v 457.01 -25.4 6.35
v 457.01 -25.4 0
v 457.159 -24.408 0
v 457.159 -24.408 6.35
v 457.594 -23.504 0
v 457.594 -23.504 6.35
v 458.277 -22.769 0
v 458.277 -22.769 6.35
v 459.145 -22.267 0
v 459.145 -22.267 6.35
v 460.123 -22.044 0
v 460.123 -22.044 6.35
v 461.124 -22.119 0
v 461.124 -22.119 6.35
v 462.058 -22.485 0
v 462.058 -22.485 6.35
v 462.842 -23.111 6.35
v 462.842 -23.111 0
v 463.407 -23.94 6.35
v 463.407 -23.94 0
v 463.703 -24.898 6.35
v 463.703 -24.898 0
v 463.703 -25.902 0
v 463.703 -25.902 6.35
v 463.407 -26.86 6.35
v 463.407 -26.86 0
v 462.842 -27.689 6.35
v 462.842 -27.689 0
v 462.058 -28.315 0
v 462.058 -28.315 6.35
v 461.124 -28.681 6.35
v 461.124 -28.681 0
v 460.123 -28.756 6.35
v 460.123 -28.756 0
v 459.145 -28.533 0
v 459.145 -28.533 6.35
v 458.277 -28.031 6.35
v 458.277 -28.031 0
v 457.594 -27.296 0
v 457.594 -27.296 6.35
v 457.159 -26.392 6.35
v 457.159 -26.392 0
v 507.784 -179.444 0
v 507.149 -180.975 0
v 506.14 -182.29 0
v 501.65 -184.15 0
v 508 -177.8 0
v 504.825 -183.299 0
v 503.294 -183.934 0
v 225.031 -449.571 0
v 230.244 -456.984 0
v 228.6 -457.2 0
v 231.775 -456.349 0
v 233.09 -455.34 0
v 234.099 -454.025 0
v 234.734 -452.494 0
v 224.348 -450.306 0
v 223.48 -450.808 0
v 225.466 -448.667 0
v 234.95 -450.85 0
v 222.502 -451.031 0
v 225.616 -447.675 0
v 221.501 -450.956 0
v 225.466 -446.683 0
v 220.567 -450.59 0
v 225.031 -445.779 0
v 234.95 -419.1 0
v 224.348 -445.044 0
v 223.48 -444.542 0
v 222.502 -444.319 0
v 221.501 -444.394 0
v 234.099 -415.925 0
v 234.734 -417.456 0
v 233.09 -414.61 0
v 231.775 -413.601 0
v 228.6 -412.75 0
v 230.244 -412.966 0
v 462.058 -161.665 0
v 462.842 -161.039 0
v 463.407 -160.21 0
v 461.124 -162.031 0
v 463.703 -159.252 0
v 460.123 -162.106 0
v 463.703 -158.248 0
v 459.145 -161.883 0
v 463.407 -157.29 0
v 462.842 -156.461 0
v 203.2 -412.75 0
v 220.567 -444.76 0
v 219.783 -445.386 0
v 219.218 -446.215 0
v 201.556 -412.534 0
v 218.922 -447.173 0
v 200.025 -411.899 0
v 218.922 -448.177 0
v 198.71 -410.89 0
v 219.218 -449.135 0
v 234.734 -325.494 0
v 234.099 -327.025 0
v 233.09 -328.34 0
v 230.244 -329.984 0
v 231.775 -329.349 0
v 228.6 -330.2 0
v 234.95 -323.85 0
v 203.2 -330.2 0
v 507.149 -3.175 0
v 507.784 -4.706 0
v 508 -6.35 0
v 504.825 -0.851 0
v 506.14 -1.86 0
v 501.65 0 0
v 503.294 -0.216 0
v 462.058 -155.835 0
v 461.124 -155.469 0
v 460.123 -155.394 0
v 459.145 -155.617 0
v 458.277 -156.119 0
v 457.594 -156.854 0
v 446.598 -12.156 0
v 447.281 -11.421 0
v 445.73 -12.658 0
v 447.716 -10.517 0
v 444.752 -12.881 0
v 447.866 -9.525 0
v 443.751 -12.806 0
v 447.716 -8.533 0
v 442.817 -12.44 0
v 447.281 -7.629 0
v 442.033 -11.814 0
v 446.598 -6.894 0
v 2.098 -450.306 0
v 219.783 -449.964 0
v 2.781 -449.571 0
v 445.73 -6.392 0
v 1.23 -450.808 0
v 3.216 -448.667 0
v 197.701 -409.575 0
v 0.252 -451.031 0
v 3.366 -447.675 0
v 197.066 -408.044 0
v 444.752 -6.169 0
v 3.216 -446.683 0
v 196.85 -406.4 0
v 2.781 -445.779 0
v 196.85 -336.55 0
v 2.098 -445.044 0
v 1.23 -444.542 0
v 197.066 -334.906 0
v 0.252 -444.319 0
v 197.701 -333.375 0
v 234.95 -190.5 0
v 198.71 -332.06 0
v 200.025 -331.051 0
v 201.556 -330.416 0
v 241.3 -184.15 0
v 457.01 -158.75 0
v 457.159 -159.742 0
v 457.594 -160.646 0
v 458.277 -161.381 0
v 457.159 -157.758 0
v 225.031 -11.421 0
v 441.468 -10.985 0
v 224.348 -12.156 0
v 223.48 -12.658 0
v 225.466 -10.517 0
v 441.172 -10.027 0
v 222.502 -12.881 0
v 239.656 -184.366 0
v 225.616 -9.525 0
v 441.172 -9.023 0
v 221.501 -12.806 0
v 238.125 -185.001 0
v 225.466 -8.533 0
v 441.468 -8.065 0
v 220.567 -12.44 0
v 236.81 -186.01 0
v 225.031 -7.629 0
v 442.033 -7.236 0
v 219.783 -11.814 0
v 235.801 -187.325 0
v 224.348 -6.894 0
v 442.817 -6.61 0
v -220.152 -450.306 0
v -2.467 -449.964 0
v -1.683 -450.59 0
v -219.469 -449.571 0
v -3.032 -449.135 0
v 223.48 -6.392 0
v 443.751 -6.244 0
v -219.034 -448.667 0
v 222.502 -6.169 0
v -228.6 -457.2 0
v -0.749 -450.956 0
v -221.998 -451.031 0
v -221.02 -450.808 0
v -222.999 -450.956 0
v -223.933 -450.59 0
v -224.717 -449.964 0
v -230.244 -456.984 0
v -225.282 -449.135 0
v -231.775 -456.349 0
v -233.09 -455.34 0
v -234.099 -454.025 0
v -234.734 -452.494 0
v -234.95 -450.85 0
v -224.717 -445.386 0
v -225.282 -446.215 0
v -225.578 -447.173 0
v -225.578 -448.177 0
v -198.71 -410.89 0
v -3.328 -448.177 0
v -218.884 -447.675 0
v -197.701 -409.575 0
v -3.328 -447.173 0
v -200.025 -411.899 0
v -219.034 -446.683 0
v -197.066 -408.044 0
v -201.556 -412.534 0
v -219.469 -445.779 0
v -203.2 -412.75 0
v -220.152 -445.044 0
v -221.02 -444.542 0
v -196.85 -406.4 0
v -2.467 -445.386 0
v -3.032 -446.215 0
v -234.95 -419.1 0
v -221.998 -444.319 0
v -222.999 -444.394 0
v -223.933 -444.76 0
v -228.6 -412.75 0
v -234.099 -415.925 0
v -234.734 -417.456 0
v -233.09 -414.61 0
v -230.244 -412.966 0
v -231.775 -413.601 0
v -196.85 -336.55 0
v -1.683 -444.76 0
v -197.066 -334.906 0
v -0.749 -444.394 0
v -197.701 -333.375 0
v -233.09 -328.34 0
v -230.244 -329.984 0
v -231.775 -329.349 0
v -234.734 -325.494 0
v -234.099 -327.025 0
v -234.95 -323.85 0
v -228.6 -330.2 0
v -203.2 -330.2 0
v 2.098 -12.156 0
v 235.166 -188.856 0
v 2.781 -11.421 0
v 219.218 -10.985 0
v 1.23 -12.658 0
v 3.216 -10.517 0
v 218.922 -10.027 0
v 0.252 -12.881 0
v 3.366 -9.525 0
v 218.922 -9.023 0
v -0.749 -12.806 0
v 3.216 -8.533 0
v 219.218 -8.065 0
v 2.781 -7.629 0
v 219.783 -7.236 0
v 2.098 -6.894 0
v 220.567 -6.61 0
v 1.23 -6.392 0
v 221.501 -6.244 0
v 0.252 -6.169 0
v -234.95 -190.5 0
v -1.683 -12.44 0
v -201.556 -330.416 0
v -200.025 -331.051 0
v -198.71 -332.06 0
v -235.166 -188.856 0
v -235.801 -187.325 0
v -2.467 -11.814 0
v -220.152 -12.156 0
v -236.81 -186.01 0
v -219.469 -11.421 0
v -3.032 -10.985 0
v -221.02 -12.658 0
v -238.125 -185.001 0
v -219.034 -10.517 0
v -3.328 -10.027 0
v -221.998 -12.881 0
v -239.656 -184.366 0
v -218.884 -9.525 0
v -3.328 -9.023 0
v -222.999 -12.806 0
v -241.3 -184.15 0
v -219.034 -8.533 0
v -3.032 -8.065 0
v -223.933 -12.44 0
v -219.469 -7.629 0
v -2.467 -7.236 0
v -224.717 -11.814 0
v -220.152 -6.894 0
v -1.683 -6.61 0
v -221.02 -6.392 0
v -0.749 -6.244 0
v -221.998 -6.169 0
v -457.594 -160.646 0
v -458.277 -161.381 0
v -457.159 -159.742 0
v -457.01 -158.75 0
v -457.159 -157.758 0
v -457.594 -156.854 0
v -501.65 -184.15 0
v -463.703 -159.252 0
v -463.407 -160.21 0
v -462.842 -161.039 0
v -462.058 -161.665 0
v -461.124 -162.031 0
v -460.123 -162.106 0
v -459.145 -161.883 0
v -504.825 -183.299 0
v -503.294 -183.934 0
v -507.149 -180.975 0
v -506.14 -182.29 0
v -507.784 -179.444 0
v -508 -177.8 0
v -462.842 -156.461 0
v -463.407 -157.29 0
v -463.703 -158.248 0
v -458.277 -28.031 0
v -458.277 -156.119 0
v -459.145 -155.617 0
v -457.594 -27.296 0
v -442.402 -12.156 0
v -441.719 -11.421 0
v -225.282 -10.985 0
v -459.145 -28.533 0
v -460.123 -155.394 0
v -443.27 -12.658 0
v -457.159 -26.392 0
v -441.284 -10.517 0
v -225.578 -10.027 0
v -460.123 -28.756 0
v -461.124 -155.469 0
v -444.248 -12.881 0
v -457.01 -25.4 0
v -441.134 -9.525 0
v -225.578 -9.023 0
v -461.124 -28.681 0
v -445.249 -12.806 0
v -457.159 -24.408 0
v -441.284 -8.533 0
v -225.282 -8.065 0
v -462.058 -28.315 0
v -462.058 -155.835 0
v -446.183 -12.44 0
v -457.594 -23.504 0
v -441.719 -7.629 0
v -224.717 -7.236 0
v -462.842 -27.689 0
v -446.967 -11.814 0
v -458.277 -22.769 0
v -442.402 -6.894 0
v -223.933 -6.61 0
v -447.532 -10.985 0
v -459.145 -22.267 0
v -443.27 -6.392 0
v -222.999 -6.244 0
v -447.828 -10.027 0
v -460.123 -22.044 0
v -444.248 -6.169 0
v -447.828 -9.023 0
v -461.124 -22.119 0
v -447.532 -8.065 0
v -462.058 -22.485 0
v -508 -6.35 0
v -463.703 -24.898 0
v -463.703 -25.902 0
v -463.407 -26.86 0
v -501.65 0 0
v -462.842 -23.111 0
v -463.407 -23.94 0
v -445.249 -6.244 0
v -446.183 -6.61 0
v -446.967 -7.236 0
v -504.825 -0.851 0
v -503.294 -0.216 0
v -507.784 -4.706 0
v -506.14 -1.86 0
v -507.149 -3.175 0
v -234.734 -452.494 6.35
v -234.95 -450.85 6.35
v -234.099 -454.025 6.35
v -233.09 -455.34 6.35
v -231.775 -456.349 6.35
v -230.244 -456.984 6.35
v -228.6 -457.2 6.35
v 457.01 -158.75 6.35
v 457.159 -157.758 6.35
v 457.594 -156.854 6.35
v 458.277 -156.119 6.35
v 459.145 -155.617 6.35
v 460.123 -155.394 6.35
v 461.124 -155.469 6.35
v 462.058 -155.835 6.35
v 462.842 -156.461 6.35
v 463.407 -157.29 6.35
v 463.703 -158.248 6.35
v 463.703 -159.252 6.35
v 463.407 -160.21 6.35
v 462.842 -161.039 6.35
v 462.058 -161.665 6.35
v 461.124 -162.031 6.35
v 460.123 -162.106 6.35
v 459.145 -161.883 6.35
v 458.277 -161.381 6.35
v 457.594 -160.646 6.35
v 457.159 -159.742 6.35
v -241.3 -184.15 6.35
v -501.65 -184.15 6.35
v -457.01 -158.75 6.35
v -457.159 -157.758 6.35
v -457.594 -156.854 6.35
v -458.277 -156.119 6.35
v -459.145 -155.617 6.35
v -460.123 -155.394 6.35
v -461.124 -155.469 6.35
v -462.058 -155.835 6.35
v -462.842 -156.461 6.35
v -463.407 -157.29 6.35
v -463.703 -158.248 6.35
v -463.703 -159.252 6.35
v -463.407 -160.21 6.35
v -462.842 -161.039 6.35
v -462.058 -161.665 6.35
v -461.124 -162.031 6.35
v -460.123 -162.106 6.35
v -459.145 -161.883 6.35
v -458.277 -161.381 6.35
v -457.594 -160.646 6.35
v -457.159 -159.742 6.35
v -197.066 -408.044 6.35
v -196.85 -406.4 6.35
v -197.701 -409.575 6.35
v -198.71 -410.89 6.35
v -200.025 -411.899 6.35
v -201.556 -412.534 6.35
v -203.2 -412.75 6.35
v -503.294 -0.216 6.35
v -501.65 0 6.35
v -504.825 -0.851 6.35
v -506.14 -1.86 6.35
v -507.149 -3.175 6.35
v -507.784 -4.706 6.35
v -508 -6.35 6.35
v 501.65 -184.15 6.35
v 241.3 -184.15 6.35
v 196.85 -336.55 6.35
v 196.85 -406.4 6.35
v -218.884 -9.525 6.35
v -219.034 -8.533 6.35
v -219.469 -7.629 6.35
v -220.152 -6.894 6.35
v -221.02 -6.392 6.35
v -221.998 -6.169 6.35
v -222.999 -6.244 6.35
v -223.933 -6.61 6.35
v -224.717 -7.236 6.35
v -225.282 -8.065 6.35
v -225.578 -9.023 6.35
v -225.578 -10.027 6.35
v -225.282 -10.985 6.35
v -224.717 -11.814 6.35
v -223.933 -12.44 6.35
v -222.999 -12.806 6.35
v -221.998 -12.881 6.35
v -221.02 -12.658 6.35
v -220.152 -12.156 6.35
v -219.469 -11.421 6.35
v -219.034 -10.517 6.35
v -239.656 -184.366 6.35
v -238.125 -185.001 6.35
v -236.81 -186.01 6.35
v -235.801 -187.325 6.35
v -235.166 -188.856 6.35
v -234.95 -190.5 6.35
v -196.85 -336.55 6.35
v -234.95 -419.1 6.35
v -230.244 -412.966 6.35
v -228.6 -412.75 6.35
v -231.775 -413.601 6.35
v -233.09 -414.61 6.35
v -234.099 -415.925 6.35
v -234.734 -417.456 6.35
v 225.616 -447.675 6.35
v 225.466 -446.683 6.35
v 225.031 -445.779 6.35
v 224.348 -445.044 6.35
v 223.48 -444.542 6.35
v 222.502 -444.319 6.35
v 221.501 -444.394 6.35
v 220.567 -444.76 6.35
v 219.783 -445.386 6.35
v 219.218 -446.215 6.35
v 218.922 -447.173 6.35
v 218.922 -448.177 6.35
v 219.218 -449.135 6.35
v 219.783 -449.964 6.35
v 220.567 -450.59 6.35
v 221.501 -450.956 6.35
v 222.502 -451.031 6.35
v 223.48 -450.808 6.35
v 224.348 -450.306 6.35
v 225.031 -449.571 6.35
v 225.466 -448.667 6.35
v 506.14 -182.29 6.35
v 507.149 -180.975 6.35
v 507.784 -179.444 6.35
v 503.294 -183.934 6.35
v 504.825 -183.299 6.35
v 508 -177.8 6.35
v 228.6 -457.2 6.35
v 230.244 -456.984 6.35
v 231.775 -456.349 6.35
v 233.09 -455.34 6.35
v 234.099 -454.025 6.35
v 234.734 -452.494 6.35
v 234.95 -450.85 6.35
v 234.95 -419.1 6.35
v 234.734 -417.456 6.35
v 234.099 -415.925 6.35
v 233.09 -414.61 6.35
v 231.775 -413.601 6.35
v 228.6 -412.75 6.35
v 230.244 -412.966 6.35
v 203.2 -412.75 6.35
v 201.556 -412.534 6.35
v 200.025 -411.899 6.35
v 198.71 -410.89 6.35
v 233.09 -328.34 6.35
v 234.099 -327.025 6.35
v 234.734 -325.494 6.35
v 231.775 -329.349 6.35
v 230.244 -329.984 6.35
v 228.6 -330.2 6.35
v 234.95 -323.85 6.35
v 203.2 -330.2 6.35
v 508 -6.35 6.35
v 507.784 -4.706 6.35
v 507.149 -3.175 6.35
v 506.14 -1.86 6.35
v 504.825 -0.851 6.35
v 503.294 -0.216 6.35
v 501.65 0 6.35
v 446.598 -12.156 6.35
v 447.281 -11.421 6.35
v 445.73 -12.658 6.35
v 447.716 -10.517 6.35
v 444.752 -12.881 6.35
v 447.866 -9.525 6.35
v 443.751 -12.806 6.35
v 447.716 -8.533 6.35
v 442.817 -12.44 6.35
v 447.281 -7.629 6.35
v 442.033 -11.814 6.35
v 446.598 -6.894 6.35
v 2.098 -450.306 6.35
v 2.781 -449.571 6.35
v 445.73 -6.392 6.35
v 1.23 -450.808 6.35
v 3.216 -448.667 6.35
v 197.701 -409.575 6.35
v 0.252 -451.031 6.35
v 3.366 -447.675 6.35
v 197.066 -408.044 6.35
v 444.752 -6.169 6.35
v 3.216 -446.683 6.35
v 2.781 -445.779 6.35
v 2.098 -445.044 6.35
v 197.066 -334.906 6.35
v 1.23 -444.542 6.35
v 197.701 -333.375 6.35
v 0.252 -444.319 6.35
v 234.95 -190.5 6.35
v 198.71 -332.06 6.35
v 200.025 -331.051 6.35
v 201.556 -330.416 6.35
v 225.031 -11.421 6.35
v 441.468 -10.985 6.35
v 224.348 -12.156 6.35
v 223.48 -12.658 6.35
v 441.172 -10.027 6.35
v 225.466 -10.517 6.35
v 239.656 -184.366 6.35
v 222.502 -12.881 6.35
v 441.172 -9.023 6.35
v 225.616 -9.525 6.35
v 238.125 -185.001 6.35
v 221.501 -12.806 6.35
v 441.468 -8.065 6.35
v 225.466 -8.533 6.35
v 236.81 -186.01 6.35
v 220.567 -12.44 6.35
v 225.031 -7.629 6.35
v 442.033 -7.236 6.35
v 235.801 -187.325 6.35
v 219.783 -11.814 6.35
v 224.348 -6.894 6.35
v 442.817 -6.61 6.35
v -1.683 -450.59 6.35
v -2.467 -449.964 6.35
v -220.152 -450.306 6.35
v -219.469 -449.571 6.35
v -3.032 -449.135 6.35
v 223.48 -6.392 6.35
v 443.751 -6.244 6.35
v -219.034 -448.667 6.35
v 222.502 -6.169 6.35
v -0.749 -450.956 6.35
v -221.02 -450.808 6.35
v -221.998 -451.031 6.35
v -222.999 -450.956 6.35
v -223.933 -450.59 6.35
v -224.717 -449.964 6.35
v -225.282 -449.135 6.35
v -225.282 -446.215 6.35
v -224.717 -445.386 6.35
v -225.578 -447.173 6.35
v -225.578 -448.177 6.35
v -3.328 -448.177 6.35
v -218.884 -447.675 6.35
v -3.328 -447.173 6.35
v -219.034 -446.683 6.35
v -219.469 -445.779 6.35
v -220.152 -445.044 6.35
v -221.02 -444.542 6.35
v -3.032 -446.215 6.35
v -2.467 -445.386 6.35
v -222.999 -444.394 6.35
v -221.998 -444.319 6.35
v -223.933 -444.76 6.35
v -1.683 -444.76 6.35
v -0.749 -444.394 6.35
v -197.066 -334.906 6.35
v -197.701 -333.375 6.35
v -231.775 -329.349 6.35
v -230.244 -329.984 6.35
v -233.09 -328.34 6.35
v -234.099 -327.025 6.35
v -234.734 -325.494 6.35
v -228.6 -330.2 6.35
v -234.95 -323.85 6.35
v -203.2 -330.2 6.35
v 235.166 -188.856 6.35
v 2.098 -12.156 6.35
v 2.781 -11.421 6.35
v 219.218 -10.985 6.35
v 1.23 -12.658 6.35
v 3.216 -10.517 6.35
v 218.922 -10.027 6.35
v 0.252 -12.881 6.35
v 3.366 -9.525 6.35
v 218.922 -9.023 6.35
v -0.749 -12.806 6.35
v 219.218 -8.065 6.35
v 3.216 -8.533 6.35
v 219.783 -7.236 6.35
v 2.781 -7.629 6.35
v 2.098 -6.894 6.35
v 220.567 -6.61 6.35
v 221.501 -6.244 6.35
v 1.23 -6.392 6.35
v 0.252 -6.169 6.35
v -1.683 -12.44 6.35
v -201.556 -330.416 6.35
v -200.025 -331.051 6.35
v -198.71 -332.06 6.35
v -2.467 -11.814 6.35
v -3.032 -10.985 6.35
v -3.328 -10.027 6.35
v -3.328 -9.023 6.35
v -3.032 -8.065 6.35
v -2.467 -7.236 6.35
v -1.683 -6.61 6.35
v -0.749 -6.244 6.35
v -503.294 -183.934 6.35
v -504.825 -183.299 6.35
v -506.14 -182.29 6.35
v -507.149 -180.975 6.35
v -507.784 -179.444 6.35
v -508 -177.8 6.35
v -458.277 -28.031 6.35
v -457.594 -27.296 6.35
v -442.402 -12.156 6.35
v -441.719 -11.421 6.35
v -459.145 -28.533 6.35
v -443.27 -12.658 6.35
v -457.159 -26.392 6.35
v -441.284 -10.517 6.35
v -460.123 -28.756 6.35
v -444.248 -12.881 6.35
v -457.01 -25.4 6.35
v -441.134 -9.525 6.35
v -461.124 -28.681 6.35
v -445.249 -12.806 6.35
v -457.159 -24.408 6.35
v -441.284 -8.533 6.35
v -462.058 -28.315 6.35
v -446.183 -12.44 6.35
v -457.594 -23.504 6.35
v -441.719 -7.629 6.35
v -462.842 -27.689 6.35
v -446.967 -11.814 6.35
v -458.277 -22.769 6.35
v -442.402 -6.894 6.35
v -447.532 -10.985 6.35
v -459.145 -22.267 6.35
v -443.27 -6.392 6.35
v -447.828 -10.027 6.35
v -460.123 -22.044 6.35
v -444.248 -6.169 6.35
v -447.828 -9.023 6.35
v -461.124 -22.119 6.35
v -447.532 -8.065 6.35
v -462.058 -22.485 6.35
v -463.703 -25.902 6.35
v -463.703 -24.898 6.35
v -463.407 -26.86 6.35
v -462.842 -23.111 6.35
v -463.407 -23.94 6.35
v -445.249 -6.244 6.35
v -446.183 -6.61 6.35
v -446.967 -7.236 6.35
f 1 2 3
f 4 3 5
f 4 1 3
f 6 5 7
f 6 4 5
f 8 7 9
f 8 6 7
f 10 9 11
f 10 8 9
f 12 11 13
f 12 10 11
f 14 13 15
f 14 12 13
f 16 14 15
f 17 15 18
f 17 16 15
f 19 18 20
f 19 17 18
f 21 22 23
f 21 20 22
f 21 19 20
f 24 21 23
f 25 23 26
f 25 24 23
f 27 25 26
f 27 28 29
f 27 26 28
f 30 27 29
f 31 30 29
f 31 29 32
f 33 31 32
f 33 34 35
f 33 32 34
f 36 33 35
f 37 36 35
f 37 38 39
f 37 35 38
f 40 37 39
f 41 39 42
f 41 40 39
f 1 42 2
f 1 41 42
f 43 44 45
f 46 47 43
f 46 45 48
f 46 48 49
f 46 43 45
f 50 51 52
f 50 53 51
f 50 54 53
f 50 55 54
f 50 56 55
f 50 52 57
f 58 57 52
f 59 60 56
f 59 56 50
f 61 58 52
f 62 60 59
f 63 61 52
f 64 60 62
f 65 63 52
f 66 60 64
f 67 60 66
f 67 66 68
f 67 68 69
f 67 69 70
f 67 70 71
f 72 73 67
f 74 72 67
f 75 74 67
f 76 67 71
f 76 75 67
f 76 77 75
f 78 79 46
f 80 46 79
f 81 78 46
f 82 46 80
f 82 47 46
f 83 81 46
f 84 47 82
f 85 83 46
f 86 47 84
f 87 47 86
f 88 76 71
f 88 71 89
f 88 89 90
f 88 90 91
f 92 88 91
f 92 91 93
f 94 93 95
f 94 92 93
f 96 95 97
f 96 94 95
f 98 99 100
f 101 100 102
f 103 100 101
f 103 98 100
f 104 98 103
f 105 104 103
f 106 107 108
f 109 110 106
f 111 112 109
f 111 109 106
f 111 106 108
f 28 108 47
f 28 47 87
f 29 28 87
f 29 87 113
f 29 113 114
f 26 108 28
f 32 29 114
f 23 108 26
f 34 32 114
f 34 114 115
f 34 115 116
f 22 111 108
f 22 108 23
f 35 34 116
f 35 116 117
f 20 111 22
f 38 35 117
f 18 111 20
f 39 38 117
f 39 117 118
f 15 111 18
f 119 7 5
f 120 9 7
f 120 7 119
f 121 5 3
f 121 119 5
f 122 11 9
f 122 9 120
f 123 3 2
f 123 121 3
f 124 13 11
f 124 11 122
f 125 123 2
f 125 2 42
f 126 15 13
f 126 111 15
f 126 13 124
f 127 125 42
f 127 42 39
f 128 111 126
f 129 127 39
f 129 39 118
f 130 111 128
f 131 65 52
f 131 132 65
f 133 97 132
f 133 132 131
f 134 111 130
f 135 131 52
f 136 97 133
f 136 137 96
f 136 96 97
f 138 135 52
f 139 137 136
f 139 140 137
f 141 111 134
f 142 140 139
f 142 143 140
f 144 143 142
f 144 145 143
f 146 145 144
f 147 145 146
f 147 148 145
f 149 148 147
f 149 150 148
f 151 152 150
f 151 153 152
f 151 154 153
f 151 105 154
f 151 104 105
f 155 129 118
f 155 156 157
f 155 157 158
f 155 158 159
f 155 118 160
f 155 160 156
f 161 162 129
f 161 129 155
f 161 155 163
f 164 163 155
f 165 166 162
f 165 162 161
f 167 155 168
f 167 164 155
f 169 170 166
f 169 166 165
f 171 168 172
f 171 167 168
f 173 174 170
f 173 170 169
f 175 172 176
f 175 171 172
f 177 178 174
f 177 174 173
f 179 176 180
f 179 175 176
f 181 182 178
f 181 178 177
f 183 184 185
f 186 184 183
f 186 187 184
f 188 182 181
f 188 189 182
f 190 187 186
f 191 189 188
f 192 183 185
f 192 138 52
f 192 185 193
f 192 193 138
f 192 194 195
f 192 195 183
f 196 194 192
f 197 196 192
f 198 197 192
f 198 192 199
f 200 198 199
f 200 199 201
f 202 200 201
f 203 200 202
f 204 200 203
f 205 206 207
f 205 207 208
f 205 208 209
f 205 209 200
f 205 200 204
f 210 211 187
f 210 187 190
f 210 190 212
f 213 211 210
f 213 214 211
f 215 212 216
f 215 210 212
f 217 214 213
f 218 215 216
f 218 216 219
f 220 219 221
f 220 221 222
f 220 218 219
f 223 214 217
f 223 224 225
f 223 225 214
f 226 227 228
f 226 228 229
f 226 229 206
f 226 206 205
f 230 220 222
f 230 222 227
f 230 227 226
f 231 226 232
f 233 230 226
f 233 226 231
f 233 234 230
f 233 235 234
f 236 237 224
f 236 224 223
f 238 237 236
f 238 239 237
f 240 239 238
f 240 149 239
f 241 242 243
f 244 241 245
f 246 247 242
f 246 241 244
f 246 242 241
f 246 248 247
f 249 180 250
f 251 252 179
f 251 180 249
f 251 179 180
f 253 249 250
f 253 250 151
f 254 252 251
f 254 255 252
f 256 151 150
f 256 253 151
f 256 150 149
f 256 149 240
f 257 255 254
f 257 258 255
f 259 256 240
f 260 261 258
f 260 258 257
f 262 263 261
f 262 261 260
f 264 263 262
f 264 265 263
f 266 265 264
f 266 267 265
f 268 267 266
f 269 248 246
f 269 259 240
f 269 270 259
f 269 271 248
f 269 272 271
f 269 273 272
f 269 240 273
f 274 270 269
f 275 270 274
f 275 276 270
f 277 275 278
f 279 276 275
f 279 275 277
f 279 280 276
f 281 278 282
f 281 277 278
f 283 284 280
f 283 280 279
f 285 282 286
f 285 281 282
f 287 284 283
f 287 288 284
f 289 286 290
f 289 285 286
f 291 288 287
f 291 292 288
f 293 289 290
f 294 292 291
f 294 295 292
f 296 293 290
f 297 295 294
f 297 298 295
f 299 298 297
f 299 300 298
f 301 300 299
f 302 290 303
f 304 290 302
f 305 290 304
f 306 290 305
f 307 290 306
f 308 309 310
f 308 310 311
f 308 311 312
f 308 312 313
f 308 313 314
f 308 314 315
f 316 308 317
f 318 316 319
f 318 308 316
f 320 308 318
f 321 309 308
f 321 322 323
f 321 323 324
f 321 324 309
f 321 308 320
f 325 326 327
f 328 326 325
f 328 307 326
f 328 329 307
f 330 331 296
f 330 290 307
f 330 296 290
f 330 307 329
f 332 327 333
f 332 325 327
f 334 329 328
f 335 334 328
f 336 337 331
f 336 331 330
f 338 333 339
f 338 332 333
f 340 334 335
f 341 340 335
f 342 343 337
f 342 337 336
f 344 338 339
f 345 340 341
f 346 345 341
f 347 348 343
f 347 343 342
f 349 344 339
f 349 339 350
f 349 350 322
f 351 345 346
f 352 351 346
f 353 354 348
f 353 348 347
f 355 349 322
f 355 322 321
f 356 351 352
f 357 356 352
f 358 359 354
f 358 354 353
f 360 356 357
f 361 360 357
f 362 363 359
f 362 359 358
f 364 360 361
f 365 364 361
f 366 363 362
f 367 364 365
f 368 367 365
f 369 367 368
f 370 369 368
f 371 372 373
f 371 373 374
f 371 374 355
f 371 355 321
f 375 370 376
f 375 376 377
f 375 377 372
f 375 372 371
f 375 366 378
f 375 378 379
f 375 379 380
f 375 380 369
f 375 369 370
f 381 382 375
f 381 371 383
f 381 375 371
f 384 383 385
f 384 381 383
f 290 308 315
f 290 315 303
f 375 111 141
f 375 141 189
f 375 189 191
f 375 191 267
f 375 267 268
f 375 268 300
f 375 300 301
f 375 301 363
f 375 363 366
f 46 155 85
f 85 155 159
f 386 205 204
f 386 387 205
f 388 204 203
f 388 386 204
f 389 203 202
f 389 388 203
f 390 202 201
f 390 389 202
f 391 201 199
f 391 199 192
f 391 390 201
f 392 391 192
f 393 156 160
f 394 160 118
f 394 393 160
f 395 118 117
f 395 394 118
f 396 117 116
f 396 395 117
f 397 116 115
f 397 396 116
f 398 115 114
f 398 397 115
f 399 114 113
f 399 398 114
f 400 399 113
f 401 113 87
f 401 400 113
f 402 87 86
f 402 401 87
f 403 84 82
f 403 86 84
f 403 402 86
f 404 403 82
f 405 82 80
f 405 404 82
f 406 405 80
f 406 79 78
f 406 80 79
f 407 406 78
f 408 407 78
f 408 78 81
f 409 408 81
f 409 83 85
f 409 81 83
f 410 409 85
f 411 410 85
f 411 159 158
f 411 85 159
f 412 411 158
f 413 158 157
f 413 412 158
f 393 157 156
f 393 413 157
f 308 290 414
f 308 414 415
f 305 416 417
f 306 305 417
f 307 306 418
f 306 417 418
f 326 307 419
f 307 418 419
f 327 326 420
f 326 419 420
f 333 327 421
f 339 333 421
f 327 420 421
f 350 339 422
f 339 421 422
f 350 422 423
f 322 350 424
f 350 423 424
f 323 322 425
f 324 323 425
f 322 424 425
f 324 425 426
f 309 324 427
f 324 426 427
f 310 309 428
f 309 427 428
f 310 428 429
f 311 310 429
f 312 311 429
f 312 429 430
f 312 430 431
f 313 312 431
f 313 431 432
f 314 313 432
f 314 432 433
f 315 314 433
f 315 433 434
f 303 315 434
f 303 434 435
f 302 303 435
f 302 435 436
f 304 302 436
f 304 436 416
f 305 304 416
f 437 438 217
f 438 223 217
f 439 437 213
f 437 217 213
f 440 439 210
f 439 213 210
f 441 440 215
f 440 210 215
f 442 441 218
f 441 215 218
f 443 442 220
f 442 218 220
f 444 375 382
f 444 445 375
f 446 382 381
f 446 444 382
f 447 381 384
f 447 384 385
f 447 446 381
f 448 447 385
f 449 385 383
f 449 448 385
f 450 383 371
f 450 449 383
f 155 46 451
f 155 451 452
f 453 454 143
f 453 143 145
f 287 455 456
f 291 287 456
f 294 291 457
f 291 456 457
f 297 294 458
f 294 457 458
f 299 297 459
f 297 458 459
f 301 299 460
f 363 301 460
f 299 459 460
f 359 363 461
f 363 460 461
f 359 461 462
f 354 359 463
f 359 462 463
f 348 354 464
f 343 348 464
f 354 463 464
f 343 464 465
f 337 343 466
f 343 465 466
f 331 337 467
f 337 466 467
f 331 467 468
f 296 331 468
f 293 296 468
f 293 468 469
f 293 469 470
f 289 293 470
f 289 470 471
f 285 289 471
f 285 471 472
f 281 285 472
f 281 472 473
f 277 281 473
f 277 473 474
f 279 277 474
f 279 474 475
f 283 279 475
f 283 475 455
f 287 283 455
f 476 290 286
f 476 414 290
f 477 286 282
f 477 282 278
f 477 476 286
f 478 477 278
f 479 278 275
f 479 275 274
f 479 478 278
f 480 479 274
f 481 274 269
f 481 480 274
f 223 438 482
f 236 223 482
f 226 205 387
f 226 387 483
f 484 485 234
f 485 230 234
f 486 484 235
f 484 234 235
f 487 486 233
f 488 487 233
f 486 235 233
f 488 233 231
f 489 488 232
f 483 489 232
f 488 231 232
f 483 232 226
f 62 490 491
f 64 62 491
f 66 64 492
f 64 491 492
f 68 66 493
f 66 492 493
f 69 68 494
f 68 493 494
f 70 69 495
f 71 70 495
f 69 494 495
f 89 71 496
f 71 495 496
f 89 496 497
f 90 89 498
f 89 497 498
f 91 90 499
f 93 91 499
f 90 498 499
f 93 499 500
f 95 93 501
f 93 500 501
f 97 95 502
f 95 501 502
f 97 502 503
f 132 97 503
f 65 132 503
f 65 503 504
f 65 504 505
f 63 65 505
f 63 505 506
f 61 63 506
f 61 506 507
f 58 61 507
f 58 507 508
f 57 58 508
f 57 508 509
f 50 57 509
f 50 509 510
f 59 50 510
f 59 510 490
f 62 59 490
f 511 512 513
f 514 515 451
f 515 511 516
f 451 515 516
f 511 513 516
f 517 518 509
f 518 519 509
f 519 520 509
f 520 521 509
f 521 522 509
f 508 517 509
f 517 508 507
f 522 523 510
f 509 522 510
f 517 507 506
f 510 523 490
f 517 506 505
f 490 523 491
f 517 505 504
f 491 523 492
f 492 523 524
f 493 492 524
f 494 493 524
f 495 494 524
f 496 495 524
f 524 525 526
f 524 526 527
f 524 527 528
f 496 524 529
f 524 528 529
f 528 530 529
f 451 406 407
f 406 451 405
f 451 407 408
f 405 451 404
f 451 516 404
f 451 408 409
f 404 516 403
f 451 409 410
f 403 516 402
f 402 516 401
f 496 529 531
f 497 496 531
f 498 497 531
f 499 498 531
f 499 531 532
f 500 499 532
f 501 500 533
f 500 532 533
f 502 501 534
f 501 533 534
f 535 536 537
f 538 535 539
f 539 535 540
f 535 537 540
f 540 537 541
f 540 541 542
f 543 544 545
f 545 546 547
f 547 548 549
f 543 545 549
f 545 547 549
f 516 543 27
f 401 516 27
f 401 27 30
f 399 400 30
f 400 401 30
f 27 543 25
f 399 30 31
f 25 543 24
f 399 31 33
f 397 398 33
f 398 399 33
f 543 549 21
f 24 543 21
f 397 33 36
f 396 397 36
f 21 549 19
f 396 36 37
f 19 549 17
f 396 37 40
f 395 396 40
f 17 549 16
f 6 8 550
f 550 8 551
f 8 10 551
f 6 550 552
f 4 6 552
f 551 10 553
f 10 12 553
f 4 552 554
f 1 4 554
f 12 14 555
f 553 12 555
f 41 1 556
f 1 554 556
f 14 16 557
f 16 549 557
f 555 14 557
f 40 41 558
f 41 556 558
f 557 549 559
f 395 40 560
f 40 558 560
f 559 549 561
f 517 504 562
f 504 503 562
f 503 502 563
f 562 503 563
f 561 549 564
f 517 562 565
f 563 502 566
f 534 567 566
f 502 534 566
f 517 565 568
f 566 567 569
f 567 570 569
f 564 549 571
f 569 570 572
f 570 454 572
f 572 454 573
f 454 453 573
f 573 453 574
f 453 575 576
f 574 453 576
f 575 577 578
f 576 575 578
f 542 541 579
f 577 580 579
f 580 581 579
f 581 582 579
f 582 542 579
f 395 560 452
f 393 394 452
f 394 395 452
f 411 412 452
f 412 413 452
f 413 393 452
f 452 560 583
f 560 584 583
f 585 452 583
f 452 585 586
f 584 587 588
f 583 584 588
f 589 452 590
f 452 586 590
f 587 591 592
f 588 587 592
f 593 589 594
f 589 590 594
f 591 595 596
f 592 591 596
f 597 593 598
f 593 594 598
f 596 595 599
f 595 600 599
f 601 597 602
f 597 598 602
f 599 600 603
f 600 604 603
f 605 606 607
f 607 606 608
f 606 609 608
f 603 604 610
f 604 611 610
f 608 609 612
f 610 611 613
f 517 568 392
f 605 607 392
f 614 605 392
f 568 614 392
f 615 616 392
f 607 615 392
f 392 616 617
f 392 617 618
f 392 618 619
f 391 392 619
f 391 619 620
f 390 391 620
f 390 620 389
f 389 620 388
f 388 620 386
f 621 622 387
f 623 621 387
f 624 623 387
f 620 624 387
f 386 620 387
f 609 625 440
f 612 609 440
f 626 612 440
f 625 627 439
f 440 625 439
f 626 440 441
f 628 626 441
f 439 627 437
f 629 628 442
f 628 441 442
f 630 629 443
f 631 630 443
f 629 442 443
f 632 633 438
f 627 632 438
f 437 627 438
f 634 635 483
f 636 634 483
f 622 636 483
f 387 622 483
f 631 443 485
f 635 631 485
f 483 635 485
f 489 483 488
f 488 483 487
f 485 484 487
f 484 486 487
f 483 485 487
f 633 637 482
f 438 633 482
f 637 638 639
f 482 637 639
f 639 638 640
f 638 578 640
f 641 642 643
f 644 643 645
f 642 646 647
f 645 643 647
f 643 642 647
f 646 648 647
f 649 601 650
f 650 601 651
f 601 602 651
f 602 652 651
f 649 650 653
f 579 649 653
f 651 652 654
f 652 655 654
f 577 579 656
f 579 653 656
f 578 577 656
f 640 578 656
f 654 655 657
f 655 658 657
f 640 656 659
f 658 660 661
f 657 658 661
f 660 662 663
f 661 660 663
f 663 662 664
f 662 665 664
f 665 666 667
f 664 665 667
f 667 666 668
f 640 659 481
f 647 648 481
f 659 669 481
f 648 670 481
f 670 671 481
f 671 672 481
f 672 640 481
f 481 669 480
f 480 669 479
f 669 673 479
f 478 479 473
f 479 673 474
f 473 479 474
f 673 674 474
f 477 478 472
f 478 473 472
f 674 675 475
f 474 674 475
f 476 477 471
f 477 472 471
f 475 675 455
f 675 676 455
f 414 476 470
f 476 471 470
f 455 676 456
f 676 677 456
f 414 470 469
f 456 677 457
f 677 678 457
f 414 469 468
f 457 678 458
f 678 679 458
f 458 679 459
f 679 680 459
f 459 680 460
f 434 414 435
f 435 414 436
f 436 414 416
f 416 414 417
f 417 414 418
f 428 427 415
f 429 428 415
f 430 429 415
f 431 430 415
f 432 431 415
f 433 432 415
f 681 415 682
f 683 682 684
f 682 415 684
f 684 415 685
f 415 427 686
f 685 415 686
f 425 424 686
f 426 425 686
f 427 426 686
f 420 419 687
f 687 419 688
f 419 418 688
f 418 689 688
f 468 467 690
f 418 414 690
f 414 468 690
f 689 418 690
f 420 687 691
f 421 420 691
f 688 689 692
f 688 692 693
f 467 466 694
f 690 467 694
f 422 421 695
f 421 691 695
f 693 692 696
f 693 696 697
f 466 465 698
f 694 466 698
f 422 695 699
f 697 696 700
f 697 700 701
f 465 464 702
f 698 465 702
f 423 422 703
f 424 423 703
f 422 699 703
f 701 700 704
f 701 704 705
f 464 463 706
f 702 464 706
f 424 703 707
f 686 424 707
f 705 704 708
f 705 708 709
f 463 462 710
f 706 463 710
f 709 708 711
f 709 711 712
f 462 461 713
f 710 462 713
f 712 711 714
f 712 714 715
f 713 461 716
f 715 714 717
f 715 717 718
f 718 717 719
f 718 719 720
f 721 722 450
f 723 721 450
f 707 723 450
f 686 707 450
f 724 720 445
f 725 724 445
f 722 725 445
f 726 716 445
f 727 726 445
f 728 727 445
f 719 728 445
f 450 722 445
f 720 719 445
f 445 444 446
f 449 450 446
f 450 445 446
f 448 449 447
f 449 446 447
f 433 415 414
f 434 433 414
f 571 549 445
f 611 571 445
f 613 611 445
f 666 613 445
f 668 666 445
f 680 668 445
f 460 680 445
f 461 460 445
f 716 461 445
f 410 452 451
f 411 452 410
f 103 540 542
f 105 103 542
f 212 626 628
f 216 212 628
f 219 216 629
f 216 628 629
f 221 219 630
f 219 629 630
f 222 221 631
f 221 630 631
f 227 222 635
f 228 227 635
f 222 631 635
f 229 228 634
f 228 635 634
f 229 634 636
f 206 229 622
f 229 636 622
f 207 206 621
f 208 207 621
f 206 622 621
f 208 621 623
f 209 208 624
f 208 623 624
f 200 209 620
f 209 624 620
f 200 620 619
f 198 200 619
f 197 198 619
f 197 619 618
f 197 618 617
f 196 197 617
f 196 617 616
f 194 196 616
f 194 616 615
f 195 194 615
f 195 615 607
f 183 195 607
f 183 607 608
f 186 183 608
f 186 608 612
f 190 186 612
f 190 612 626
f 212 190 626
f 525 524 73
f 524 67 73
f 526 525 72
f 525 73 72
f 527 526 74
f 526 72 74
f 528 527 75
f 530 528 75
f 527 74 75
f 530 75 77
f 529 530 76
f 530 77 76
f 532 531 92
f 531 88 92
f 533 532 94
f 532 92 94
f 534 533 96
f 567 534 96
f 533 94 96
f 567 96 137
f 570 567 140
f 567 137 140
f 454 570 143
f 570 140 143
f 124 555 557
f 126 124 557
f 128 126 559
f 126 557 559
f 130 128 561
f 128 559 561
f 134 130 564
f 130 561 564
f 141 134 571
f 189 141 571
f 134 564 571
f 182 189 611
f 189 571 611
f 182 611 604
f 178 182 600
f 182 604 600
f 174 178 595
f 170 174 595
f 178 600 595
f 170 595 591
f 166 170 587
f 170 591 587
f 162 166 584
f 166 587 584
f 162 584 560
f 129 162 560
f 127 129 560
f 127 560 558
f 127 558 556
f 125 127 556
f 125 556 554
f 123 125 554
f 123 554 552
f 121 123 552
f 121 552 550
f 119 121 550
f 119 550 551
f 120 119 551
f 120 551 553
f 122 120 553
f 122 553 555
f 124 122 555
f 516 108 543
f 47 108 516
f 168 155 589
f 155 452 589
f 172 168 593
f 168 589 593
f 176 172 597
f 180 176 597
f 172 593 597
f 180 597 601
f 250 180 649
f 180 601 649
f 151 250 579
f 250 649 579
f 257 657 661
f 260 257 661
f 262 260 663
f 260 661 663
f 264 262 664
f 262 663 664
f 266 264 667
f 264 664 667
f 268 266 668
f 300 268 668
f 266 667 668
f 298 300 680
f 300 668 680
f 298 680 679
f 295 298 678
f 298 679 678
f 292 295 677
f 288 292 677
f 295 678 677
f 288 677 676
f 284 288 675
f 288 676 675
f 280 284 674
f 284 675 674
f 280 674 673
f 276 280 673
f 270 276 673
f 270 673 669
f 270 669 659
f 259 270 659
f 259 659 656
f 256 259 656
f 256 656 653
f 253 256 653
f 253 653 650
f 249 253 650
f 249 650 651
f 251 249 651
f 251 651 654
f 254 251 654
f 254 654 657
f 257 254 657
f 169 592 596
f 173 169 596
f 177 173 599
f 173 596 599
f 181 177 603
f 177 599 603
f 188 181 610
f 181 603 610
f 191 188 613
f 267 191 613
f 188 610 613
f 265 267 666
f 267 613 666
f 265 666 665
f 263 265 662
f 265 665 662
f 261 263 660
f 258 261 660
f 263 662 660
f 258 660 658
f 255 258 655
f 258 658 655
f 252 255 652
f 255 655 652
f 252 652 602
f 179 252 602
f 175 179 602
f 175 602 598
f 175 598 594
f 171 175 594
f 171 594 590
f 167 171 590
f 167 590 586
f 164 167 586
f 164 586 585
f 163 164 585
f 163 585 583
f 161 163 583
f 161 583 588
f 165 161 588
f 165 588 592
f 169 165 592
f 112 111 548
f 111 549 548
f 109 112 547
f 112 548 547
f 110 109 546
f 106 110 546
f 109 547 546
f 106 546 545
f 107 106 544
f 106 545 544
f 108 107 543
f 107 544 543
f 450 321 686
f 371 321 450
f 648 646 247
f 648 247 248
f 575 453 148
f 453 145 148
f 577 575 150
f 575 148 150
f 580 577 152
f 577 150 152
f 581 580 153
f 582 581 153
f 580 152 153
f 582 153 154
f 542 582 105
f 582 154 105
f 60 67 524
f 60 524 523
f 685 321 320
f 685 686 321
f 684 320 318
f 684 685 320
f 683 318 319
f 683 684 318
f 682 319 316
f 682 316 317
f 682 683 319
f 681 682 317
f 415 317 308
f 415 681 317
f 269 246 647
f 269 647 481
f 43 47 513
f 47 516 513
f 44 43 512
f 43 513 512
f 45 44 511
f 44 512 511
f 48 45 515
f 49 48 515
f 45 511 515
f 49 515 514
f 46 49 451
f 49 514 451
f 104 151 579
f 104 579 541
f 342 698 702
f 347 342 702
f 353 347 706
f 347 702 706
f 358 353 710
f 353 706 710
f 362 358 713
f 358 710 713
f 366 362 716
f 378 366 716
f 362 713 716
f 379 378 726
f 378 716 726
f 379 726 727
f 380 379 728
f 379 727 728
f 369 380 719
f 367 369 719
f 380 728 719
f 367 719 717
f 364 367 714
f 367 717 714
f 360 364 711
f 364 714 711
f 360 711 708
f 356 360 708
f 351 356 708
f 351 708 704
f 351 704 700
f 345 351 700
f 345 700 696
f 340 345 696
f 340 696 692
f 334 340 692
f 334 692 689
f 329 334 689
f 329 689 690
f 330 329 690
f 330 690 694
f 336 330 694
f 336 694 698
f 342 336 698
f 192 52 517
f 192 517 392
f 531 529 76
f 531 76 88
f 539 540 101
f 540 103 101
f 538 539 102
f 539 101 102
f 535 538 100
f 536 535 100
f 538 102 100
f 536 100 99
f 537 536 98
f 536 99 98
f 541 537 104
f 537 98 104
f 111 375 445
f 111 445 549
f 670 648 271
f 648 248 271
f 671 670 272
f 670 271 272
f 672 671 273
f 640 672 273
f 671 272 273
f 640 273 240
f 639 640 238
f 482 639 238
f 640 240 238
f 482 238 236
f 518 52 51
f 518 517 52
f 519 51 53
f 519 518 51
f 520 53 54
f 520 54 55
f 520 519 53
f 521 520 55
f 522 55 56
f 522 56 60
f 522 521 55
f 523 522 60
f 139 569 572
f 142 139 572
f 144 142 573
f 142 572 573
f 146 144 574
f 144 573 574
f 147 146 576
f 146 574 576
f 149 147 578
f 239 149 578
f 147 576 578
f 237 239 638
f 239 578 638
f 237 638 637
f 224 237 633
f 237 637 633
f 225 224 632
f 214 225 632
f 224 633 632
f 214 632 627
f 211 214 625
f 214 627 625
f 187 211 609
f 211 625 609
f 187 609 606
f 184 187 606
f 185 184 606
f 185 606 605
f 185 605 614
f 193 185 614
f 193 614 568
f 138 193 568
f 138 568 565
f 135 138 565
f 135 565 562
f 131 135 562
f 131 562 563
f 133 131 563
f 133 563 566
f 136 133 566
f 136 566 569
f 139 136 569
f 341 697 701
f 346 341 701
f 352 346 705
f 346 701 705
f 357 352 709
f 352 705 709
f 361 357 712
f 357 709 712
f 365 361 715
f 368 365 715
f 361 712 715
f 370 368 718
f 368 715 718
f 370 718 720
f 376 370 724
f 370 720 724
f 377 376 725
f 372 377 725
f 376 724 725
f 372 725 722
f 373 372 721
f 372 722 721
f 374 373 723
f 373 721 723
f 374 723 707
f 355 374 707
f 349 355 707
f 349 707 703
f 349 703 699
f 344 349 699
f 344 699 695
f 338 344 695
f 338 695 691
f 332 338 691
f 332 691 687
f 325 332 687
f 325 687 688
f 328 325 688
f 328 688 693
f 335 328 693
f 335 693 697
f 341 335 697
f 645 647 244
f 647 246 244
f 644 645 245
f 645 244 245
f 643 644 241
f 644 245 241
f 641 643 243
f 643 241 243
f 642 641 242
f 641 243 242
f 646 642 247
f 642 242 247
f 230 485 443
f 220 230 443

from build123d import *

# Parameters (mm, degrees)
BOSS_EXTRUDE1_DEPTH = 6.35
SKETCH2_R           = 3.3655
CUT_EXTRUDE1_DEPTH  = 7.35
SKETCH3_R           = 3.3655
CUT_EXTRUDE2_DEPTH  = 7.35
SKETCH5_W           = 38.1
SKETCH5_H           = 82.55
CUT_EXTRUDE3_DEPTH  = 7.35
FILLET1_R           = 6.35


with BuildPart() as part:
    # Sketch1 → Boss-Extrude1 (new body)
    with BuildSketch(Plane.XY):
        Polygon((-508, 0), (508, 0), (508, -184.15), (234.95, -184.15), (234.95, -457.2), (-234.95, -457.2), (-234.95, -184.15), (-508, -184.15), align=None)
    extrude(amount=BOSS_EXTRUDE1_DEPTH)

    # Sketch2 → Cut-Extrude1 (cut, through all)
    with BuildSketch(Plane.XY.offset(6.35)):
        with Locations((0, -9.525)):
            Circle(SKETCH2_R)
        with Locations((0, -447.675)):
            Circle(SKETCH2_R)
        with Locations((222.25, -9.525)):
            Circle(SKETCH2_R)
        with Locations((222.25, -447.675)):
            Circle(SKETCH2_R)
        with Locations((444.5, -9.525)):
            Circle(SKETCH2_R)
        with Locations((-222.25, -9.525)):
            Circle(SKETCH2_R)
        with Locations((-222.25, -447.675)):
            Circle(SKETCH2_R)
        with Locations((-444.5, -9.525)):
            Circle(SKETCH2_R)
    extrude(amount=-CUT_EXTRUDE1_DEPTH, mode=Mode.SUBTRACT)

    # Sketch3 → Cut-Extrude2 (cut, through all)
    with BuildSketch(Plane.XY.offset(6.35)):
        with Locations((-460.375, -25.4)):
            Circle(SKETCH3_R)
        with Locations((-460.375, -158.75)):
            Circle(SKETCH3_R)
    cut_extrude2 = extrude(amount=-CUT_EXTRUDE2_DEPTH, mode=Mode.SUBTRACT)

    # Mirror1: Cut-Extrude2 across plane
    add(cut_extrude2.mirror(Plane(origin=(0, 0, 0), x_dir=(0, 0, 1), z_dir=(1, 0, 0))), mode=Mode.SUBTRACT)

    # Sketch5 → Cut-Extrude3 (cut, through all)
    with BuildSketch(Plane.XY.offset(6.35)):
        with Locations((-215.9, -371.475)):
            Rectangle(SKETCH5_W, SKETCH5_H)
    cut_extrude3 = extrude(amount=-CUT_EXTRUDE3_DEPTH, mode=Mode.SUBTRACT)

    # Mirror2: Cut-Extrude3 across plane
    add(cut_extrude3.mirror(Plane(origin=(0, 0, 0), x_dir=(0, 0, 1), z_dir=(1, 0, 0))), mode=Mode.SUBTRACT)

    # Fillet1
    fillet1_edges = [part.edges().sort_by_distance(p)[0] for p in [
        (234.95, -330.2, 3.175),
        (234.95, -412.75, 3.175),
        (196.85, -412.75, 3.175),
        (196.85, -330.2, 3.175),
        (-508, 0, 3.175),
        (508, 0, 3.175),
        (508, -184.15, 3.175),
        (234.95, -184.15, 3.175),
        (234.95, -457.2, 3.175),
        (-234.95, -457.2, 3.175),
        (-234.95, -184.15, 3.175),
        (-508, -184.15, 3.175),
        (-234.95, -412.75, 3.175),
        (-234.95, -330.2, 3.175),
        (-196.85, -330.2, 3.175),
        (-196.85, -412.75, 3.175),
    ]]
    fillet(fillet1_edges, radius=FILLET1_R)


solid = part.part
